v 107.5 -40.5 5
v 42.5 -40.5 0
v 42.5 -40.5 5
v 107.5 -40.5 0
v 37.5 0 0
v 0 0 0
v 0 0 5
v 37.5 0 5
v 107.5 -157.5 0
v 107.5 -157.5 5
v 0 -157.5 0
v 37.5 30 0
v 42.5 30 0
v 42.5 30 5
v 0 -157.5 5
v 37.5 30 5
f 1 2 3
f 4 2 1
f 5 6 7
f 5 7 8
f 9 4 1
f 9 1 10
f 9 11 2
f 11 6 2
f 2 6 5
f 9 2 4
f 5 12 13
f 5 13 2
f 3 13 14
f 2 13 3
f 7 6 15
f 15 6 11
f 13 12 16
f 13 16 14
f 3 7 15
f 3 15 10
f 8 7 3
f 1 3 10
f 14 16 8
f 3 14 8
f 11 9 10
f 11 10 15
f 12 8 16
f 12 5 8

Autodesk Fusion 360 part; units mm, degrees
sketch "Sketch1" plane through (0, 0, 0) normal (0, 0, 1) x (1, 0, 0)
  line L0 (0, 0) -> (37.5, 0)
  line L1 (37.5, 0) -> (37.5, 30)
  line L2 (0, 0) -> (37.5, 0) construction
  line L3 (37.5, 30) -> (42.5, 30)
  line L4 (42.5, 30) -> (42.5, -40.5)
  line L5 (42.5, -40.5) -> (107.5, -40.5)
  line L6 (107.5, -40.5) -> (107.5, -157.5)
  line L7 (107.5, -157.5) -> (0, -157.5)
  line L8 (0, 0) -> (0, -157.5)
  dimension "d1" = 37.5
  dimension "d2" = 30
  dimension "d3" = 5
  dimension "d4" = 70.5
  dimension "d5" = 65
  dimension "d6" = 117
  dimension "d7" = 107.5
  dimension "d8" = 187.5
extrude "Extrude1" add sketch "Sketch1" along normal blind 5
equation "d1 = ( 75 / 2 ) * 1 mm"
equation "d5 = 20 mm + ( 15 * 3 ) * 1 mm"
equation "d6 = 67 mm + 20 mm + ( 10 * 3 ) * 1 mm"
equation "d7 = d1 + d3 + d5"
